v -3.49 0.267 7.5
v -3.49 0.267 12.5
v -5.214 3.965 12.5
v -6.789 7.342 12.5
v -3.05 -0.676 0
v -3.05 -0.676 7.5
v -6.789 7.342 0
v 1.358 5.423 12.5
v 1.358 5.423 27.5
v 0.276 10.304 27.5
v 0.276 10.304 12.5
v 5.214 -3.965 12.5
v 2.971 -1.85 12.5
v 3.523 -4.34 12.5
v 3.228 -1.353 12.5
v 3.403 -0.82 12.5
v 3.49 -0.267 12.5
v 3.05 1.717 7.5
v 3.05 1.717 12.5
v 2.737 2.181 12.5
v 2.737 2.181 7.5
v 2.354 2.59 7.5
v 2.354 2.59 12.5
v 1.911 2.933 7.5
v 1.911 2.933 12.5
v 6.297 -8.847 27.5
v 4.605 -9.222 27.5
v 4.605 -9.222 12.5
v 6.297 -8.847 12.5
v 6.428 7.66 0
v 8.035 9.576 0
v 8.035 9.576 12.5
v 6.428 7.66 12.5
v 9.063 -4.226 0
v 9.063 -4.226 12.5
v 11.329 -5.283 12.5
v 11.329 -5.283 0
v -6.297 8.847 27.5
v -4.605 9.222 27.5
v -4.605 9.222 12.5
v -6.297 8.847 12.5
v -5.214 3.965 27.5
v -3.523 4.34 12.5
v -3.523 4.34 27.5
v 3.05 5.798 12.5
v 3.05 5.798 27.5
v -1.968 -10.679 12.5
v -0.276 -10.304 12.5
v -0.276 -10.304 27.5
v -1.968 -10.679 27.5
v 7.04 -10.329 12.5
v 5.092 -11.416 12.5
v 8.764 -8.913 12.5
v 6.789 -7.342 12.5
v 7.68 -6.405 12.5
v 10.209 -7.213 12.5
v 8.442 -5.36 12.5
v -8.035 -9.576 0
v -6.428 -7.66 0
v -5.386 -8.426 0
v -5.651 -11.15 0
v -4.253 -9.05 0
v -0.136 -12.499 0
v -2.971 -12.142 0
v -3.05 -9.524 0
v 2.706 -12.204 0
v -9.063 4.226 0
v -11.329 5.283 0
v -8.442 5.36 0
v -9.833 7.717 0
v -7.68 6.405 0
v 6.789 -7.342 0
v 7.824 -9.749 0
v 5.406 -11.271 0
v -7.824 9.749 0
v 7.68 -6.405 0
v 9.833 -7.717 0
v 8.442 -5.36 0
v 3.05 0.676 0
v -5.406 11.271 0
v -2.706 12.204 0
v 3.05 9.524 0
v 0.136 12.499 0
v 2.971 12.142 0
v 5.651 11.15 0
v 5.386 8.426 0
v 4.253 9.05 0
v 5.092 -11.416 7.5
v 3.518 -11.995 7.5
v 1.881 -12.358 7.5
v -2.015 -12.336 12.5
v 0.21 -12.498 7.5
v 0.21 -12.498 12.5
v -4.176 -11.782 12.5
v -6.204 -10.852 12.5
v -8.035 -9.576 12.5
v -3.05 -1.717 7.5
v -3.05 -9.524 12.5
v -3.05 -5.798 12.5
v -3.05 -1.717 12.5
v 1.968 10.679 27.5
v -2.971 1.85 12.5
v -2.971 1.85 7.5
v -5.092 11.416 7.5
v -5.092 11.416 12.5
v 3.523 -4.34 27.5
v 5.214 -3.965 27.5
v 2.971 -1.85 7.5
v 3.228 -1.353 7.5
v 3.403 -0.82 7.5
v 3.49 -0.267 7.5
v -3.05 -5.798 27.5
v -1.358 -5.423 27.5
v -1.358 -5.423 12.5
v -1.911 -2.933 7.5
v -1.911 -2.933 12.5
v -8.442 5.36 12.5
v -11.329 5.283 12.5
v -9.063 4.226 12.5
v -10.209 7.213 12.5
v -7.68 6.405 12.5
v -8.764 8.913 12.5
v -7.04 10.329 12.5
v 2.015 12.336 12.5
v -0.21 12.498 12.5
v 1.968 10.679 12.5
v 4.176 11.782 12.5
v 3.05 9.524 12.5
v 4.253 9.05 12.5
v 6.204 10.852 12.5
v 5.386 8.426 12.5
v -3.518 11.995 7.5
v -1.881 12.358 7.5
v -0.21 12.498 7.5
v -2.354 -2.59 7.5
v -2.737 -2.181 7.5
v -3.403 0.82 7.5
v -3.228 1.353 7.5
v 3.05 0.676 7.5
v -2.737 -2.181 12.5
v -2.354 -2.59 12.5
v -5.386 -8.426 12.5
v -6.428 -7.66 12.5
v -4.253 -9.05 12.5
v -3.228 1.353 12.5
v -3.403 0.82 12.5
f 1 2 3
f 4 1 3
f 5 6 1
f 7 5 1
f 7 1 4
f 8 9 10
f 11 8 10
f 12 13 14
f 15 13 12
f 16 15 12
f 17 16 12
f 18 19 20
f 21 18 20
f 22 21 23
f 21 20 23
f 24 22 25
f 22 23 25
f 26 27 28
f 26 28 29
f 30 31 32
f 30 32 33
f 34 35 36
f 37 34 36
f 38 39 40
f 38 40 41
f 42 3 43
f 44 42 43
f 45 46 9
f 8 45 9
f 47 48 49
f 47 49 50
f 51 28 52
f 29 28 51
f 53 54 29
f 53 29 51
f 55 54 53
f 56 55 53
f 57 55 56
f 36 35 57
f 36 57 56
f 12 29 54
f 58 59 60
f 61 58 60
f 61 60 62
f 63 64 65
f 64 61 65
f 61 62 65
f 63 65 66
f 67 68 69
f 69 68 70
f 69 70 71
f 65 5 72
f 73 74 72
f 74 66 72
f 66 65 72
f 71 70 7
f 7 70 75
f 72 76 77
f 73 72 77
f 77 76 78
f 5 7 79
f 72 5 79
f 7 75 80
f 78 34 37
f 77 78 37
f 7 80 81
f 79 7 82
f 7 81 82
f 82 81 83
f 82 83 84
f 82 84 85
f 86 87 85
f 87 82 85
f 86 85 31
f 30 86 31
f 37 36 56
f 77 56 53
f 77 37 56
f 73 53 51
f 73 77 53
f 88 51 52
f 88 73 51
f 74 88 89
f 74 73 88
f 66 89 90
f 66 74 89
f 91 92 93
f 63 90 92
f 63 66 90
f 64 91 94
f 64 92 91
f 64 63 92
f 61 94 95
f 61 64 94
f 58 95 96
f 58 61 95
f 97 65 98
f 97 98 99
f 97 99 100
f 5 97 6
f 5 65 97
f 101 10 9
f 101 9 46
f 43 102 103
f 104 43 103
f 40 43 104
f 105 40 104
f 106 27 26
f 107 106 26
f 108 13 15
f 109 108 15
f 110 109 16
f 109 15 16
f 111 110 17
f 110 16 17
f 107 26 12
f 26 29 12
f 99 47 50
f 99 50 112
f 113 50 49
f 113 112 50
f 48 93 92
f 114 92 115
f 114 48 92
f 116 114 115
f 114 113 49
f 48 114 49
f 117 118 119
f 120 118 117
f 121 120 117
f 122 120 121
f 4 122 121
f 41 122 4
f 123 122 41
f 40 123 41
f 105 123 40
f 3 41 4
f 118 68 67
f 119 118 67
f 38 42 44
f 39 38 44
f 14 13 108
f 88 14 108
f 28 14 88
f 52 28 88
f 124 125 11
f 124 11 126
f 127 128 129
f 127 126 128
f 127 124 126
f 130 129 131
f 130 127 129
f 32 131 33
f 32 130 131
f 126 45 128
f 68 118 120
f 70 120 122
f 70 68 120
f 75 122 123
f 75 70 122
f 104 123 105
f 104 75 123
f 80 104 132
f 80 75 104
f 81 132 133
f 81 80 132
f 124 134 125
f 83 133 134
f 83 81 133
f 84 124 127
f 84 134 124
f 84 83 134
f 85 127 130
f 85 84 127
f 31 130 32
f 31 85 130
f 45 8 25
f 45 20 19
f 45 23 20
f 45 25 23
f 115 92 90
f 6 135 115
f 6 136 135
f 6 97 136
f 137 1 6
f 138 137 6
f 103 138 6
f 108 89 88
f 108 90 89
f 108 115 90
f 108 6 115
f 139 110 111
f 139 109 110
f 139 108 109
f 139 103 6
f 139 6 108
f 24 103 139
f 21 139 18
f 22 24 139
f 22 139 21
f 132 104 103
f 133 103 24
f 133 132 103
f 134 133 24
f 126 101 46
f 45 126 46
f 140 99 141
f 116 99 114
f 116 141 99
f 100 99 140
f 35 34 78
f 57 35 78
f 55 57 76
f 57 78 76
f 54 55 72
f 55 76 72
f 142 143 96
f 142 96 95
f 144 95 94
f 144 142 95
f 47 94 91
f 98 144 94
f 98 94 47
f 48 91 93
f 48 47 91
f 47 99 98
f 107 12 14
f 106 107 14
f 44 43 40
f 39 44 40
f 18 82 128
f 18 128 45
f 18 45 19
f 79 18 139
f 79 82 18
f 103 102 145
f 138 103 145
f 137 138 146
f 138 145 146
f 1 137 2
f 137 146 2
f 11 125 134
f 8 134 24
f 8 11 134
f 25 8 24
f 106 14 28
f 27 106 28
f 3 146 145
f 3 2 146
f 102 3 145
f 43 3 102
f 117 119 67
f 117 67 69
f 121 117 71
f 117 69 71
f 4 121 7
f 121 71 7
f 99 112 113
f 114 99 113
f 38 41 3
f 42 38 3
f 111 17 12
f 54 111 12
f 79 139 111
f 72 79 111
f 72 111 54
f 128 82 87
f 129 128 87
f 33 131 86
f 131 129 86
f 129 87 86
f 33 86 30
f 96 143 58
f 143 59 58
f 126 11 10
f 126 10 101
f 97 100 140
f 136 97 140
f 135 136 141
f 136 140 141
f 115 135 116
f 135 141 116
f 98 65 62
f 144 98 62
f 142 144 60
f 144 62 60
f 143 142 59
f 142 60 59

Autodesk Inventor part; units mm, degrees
ref_plane "YZ Plane" through (0, 0, 0) normal (1, 0, 0) x (0, 1, 0)
ref_plane "XZ Plane" through (0, 0, 0) normal (0, 1, 0) x (-1, 0, 0)
ref_plane "XY Plane" through (0, 0, 0) normal (0, 0, 1) x (1, 0, 0)
sketch "스케치2" plane through (0, 0, 0) normal (0, 0, 1) x (1, 0, 0)
  circle A0 centre (0, 0) radius 9
  line L0 (-3.05, -9.5235) -> (-3.05, -0.6762)
  line L1 (-3.05, -0.6762) -> (-6.7891, 7.3423)
  line L2 (3.05, 9.5235) -> (3.05, 0.6762)
  line L3 (3.05, 0.6762) -> (7.8873, -9.6974)
  line L4 (-3.05, -0.6762) -> (3.05, 0.6762) construction
  circle A1 centre (0, 0) radius 12.5
  line L5 (-11.3288, 5.2827) -> (11.3288, -5.2827)
  line L6 (8.0348, 9.5756) -> (-8.0348, -9.5756)
  circle A2 centre (0, 0) radius 10
  point P0 (5.7851, 6.8944)
  point P1 (-8.1568, 3.8036)
  point P2 (6.3427, -6.3851)
  point P3 (-5.7851, -6.8944)
  point P4 (8.1568, -3.8036)
  point P5 (-6.4279, -7.6604)
  point P6 (9.0631, -4.2262)
  point P7 (6.7891, -7.3423)
  point P8 (6.4279, 7.6604)
  point P9 (-9.0631, 4.2262)
  dimension "d12" = 18
  dimension "d14" = 6.1
  dimension "d15" = 25
  dimension "d16" = 6.1
  dimension "d17" = 25
  dimension "d19" = 40
  dimension "d20" = 40
  dimension "d36" = 20
extrude "돌출1" add sketch "스케치2" along normal blind 12.5 contours L2 L6 L5 L1 A0 | A0 L1 A2 L2 | A2 L5 A1 L6 | L2 L3 L5 L6 | L3 A2 L0 A0 | A0 L0 L6 L5 L3 | L5 A1 L3 A2 | L6 L0 L1 L5 | L3 A1 L6 A2 picked at (3.8905, 10.9384)
sketch "스케치3" plane through (0, 0, 12.5) normal (0, 0, 1) x (1, 0, 0)
  arc A0 (8.0348, 9.5756) -> (-11.3288, 5.2827) centre (0, 0) ccw projected
  line L0 (-11.3288, 5.2827) -> (-9.0631, 4.2262) projected
  line L1 (-6.7891, 7.3423) -> (-3.05, -0.6762) projected
  line L2 (-3.05, -0.6762) -> (-3.05, -9.5235) projected
  line L3 (-6.4279, -7.6604) -> (-8.0348, -9.5756) projected
  arc A1 (-8.0348, -9.5756) -> (11.3288, -5.2827) centre (0, 0) ccw projected
  line L4 (11.3288, -5.2827) -> (9.0631, -4.2262) projected
  line L5 (6.7891, -7.3423) -> (3.05, 0.6762) projected
  line L6 (3.05, 0.6762) -> (3.05, 9.5235) projected
  line L7 (6.4279, 7.6604) -> (8.0348, 9.5756) projected
  arc A2 (8.0348, 9.5756) -> (-11.3288, 5.2827) centre (0, 0) ccw projected
  line L8 (-2.7055, 12.2037) -> (2.7055, -12.2037)
  arc A3 (-8.0348, -9.5756) -> (11.3288, -5.2827) centre (0, 0) ccw projected
  line L9 (3.05, 0.6762) -> (3.05, 9.5235) projected
  line L10 (-3.05, -0.6762) -> (3.05, 0.6762)
  line L11 (-3.5229, 4.3404) -> (-4.6051, 9.2219)
  line L12 (-4.6051, 9.2219) -> (-6.2966, 8.8469)
  line L13 (-6.2966, 8.8469) -> (-5.2144, 3.9654)
  line L14 (-5.2144, 3.9654) -> (-3.5229, 4.3404)
  line L15 (-3.5229, 4.3404) -> (-6.2966, 8.8469) construction
  line L16 (-4.6051, 9.2219) -> (-5.2144, 3.9654) construction
  line L17 (1.3585, 5.4226) -> (0.2763, 10.3041)
  line L18 (0.2763, 10.3041) -> (1.9678, 10.679)
  line L19 (1.9678, 10.679) -> (3.05, 5.7976)
  line L20 (3.05, 5.7976) -> (1.3585, 5.4226)
  line L21 (1.3585, 5.4226) -> (1.9678, 10.679) construction
  line L22 (0.2763, 10.3041) -> (3.05, 5.7976) construction
  line L23 (-1.3585, -5.4226) -> (-0.2763, -10.3041)
  line L24 (-0.2763, -10.3041) -> (-1.9678, -10.679)
  line L25 (-1.9678, -10.679) -> (-3.05, -5.7976)
  line L26 (-3.05, -5.7976) -> (-1.3585, -5.4226)
  line L27 (-1.3585, -5.4226) -> (-1.9678, -10.679) construction
  line L28 (-0.2763, -10.3041) -> (-3.05, -5.7976) construction
  line L29 (3.5229, -4.3404) -> (4.6051, -9.2219)
  line L30 (4.6051, -9.2219) -> (5.2144, -3.9654) construction
  line L31 (4.6051, -9.2219) -> (6.2966, -8.8469)
  line L32 (6.2966, -8.8469) -> (5.2144, -3.9654)
  line L33 (5.2144, -3.9654) -> (3.5229, -4.3404)
  line L34 (3.5229, -4.3404) -> (6.2966, -8.8469) construction
  arc A4 (-6.7891, 7.3423) -> (-9.0631, 4.2262) centre (0, 0) ccw projected
  arc A5 (-6.4279, -7.6604) -> (-3.05, -9.5235) centre (0, 0) ccw projected
  arc A6 (6.7891, -7.3423) -> (9.0631, -4.2262) centre (0, 0) ccw projected
  arc A7 (6.4279, 7.6604) -> (3.05, 9.5235) centre (0, 0) ccw projected
  point P0 (3.05, 8.4674)
  point P1 (-4.9098, 6.5936)
  point P2 (1.6632, 8.0508)
  point P3 (-1.6632, -8.0508)
  point P4 (4.9098, -6.5936)
  dimension "d32" = 2.5
  dimension "d33" = 5
  dimension "d35" = 5
extrude "돌출2" add sketch "스케치3" along normal blind 15 contours L20 L17 L18 L19 | L13 L12 L11 L14 | L32 L31 L29 L33 | L26 L23 L24 L25
sketch "스케치4" plane through (0, 0, 12.5) normal (0, 0, 1) x (1, 0, 0)
  line L0 (0.2648, -12.7448) -> (-5.1462, 11.6626)
  line L1 (-5.1462, 11.6626) -> (-0.2648, 12.7448)
  line L2 (-0.2648, 12.7448) -> (5.1462, -11.6626)
  line L3 (5.1462, -11.6626) -> (0.2648, -12.7448)
  line L4 (0.2648, -12.7448) -> (-0.2648, 12.7448) construction
  line L5 (-5.1462, 11.6626) -> (5.1462, -11.6626) construction
  line L6 (-5.0577, 22.8136) -> (5.0577, -22.8136) projected
  circle A0 centre (0, 0) radius 3.5
  line L7 (-6.4279, -7.6604) -> (-8.0348, -9.5756) projected
  arc A1 (-8.0348, -9.5756) -> (11.3288, -5.2827) centre (0, 0) ccw projected
  line L8 (11.3288, -5.2827) -> (9.0631, -4.2262) projected
  arc A2 (6.7891, -7.3423) -> (9.0631, -4.2262) centre (0, 0) ccw projected
  line L9 (6.7891, -7.3423) -> (5.2144, -3.9654) projected
  line L10 (5.2144, -3.9654) -> (6.2966, -8.8469) projected
  line L11 (6.2966, -8.8469) -> (4.6051, -9.2219) projected
  line L12 (4.6051, -9.2219) -> (3.5229, -4.3404) projected
  line L13 (3.5229, -4.3404) -> (5.2144, -3.9654) projected
  line L14 (5.2144, -3.9654) -> (3.05, 0.6762) projected
  line L15 (3.05, 0.6762) -> (3.05, 5.7976) projected
  line L16 (3.05, 5.7976) -> (1.3585, 5.4226) projected
  line L17 (1.3585, 5.4226) -> (0.2763, 10.3041) projected
  line L18 (0.2763, 10.3041) -> (1.9678, 10.679) projected
  line L19 (1.9678, 10.679) -> (3.05, 5.7976) projected
  line L20 (3.05, 5.7976) -> (3.05, 9.5235) projected
  arc A3 (6.4279, 7.6604) -> (3.05, 9.5235) centre (0, 0) ccw projected
  line L21 (6.4279, 7.6604) -> (8.0348, 9.5756) projected
  arc A4 (8.0348, 9.5756) -> (-11.3288, 5.2827) centre (0, 0) ccw projected
  line L22 (-11.3288, 5.2827) -> (-9.0631, 4.2262) projected
  arc A5 (-6.7891, 7.3423) -> (-9.0631, 4.2262) centre (0, 0) ccw projected
  line L23 (-6.7891, 7.3423) -> (-5.2144, 3.9654) projected
  line L24 (-5.2144, 3.9654) -> (-6.2966, 8.8469) projected
  line L25 (-6.2966, 8.8469) -> (-4.6051, 9.2219) projected
  line L26 (-4.6051, 9.2219) -> (-3.5229, 4.3404) projected
  line L27 (-3.5229, 4.3404) -> (-5.2144, 3.9654) projected
  line L28 (-5.2144, 3.9654) -> (-3.05, -0.6762) projected
  line L29 (-3.05, -0.6762) -> (-3.05, -5.7976) projected
  line L30 (-3.05, -5.7976) -> (-1.3585, -5.4226) projected
  line L31 (-1.3585, -5.4226) -> (-0.2763, -10.3041) projected
  line L32 (-0.2763, -10.3041) -> (-1.9678, -10.679) projected
  line L33 (-1.9678, -10.679) -> (-3.05, -5.7976) projected
  line L34 (-3.05, -5.7976) -> (-3.05, -9.5235) projected
  arc A6 (-6.4279, -7.6604) -> (-3.05, -9.5235) centre (0, 0) ccw projected
  line L35 (-1.3585, -5.4226) -> (-3.05, -5.7976) projected
  line L36 (-3.05, -5.7976) -> (-1.9678, -10.679) projected
  line L37 (-1.9678, -10.679) -> (-0.2763, -10.3041) projected
  line L38 (-0.2763, -10.3041) -> (-1.3585, -5.4226) projected
  line L39 (6.2966, -8.8469) -> (5.2144, -3.9654) projected
  line L40 (5.2144, -3.9654) -> (3.5229, -4.3404) projected
  line L41 (3.5229, -4.3404) -> (4.6051, -9.2219) projected
  line L42 (4.6051, -9.2219) -> (6.2966, -8.8469) projected
  point P0 (1.9106, 2.9325)
  point P1 (2.9709, -1.8503)
  point P2 (-2.9709, 1.8503)
  point P3 (-1.9106, -2.9325)
  dimension "d37" = 7
extrude "돌출3" cut sketch "스케치4" against normal blind 5 contours L0 A0 L6 A1 | A1 L3 L0 | A0 L29 L28 L0 | L0 A0 L6 | A1 L2 L3 | L6 A0 L2 A1 | L0 A4 L6 A0 | A0 L28 L29 | L6 A0 L2 | L6 A4 L2 A0 | L2 A0 L15 L14 | A4 L0 L1 | L1 L2 A4 | L14 L15 A0
properties part number "_3D 인쇄"
